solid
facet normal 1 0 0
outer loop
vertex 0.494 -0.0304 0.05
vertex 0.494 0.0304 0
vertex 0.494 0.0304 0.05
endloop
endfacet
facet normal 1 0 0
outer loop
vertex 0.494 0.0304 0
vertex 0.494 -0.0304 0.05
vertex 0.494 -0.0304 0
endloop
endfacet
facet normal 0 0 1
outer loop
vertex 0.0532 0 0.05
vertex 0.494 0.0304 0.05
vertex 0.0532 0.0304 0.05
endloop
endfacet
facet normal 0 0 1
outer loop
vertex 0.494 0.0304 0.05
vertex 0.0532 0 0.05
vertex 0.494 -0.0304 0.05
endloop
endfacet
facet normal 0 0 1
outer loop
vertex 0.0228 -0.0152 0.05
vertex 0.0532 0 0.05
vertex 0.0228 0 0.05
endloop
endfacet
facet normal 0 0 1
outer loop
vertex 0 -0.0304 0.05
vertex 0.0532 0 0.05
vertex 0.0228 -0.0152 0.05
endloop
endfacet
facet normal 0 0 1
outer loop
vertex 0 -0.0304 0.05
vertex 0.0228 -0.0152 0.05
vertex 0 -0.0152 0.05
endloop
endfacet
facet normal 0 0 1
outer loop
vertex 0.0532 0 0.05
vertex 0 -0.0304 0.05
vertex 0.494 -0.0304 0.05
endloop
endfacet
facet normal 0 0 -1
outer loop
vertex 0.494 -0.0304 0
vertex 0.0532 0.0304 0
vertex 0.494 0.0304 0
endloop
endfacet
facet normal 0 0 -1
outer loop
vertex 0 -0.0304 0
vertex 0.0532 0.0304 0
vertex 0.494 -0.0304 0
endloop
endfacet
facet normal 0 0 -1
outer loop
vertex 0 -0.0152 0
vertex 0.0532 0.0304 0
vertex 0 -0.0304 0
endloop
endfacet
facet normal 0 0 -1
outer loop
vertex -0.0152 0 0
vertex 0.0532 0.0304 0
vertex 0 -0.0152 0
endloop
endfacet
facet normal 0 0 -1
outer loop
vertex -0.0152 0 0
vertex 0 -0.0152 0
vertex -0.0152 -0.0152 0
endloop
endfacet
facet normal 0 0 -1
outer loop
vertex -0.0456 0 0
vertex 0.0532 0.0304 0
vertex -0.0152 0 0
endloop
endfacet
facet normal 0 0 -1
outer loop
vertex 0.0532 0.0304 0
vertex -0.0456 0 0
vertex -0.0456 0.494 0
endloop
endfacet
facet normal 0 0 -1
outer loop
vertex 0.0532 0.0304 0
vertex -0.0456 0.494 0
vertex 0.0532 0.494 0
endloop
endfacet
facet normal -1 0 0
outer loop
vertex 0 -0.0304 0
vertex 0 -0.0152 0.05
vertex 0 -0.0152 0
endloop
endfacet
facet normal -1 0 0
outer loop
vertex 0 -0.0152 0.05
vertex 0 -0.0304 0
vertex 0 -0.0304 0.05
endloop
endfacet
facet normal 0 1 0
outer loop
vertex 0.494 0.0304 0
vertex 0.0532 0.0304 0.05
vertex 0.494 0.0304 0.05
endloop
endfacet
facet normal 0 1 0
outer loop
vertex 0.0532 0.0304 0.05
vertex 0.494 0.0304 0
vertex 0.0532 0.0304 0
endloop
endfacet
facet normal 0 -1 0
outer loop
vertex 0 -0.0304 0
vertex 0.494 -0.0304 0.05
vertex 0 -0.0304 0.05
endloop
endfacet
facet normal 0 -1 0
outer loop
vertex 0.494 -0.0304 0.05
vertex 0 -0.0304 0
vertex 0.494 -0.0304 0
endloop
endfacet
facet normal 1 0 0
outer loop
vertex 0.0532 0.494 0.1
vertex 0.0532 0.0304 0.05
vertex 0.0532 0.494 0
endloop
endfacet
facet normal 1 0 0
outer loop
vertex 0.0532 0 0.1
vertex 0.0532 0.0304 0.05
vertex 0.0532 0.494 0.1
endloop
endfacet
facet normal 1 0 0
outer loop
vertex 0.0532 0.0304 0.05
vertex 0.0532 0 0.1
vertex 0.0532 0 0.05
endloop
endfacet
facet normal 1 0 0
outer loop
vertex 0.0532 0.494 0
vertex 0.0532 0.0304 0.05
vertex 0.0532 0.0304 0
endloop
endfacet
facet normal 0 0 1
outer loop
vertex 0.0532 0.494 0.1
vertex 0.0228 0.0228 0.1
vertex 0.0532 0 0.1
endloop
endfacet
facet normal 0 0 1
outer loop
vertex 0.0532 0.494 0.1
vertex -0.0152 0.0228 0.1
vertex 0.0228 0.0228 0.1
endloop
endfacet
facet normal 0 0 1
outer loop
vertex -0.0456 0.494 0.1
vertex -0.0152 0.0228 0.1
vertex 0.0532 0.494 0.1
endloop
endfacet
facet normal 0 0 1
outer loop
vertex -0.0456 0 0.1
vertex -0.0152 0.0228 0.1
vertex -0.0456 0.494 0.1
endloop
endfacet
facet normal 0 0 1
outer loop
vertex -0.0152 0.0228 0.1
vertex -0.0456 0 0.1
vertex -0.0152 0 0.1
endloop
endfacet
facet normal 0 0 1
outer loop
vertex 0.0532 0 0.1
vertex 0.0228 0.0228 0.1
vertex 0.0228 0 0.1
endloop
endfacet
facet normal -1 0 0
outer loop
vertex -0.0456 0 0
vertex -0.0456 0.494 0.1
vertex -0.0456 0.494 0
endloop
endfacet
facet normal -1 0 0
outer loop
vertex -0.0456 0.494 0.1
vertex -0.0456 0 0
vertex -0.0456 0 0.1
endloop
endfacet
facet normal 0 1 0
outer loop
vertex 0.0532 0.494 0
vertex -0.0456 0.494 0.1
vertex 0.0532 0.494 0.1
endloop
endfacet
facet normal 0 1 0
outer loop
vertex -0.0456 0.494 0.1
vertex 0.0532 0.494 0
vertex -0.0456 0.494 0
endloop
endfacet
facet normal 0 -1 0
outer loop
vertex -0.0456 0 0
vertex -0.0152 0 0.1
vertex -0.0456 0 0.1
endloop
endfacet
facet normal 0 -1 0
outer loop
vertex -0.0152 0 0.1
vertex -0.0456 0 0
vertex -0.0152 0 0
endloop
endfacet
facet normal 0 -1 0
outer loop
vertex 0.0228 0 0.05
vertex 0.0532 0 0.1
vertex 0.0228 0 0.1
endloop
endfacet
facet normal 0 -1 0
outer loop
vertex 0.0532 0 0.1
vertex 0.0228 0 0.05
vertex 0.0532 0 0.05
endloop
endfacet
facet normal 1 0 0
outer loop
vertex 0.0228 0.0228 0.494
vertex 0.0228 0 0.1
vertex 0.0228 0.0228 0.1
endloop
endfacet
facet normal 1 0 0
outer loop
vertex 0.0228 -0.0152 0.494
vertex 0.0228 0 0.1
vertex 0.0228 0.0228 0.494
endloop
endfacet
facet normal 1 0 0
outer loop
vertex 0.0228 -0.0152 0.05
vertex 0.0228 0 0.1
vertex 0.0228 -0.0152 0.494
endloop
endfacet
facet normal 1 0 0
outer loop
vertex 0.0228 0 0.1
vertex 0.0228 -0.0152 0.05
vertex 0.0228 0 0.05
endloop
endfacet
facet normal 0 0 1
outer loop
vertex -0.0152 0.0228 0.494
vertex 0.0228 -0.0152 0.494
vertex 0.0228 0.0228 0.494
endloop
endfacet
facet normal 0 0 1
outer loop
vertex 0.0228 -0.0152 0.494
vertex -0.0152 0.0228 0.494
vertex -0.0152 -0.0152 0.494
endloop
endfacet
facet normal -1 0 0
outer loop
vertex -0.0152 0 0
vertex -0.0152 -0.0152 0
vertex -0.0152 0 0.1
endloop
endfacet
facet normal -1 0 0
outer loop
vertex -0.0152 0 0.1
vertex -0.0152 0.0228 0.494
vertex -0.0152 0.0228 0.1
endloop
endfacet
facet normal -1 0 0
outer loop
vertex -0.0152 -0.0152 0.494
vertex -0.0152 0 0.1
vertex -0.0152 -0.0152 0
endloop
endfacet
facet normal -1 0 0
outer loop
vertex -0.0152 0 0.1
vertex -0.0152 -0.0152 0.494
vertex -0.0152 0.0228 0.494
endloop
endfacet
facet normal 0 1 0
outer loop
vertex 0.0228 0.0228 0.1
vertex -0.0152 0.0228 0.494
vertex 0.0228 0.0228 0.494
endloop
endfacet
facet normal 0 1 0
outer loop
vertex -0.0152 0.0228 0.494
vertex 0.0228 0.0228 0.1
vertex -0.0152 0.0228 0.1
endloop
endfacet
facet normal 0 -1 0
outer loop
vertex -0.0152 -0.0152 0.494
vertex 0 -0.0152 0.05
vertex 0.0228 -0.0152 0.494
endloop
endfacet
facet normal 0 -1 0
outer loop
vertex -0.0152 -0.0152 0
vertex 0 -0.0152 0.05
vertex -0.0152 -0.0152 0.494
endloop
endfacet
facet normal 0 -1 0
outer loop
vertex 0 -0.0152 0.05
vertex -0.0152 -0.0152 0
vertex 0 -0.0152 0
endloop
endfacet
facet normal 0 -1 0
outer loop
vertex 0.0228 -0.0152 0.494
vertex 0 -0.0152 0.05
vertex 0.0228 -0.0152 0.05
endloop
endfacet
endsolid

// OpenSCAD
default_layer = 0.010;
default_px = 0.0076;
default_channel_width = 12*default_px;
default_channel_height = 10*default_layer;

module xchan(l, w=default_channel_width, h=default_channel_height, px=default_px, clr="lightblue") {
    centered_y_position = [0, -floor(w / px / 2) * px, 0];
    echo(w/px, centered_y_position[1]/px);
    color(clr)
        if (l < 0)
            mirror([1, 0, 0])
                translate(centered_y_position) cube([-l, w, h]);
            else
        translate(centered_y_position) cube([l, w, h]);
}

module ychan(l, w=default_channel_width, h=default_channel_height, px=default_px, clr="lightblue") {
    centered_x_position = [-floor(w / px / 2) * px, 0, 0];
    echo(w/px, centered_x_position[0]/px);
    color(clr)
        if (l < 0)
            mirror([0, -1, 0])
                translate(centered_x_position) cube([w, -l, h]);
            else
        translate(centered_x_position) cube([w, l, h]);
}

module zchan(l, xy=default_channel_width, px=default_px, clr="lightblue") {
    centered_xy_position = [-floor(xy / px / 2) * px, -floor(xy / px / 2) * px, 0];
    // echo(xy/px, centered_xy_position[0]/px);
    // echo(xy/px, centered_xy_position[1]/px);
    color(clr)
        translate(centered_xy_position) {
            if (l < 0)
                mirror([0, 0, 1])
                    cube([xy, xy, -l]);
                else
            cube([xy, xy, l]);
        }
}

temp_l = 65*default_px;
// echo(temp_l);   // 0.494 mm
// Test for channels with widths that are odd number of pixels
xchan(temp_l, w=8*default_px, h=5*default_layer, clr="red");
ychan(temp_l, w=13*default_px, clr="green");
zchan(temp_l, xy=5*default_px, clr="blue");
